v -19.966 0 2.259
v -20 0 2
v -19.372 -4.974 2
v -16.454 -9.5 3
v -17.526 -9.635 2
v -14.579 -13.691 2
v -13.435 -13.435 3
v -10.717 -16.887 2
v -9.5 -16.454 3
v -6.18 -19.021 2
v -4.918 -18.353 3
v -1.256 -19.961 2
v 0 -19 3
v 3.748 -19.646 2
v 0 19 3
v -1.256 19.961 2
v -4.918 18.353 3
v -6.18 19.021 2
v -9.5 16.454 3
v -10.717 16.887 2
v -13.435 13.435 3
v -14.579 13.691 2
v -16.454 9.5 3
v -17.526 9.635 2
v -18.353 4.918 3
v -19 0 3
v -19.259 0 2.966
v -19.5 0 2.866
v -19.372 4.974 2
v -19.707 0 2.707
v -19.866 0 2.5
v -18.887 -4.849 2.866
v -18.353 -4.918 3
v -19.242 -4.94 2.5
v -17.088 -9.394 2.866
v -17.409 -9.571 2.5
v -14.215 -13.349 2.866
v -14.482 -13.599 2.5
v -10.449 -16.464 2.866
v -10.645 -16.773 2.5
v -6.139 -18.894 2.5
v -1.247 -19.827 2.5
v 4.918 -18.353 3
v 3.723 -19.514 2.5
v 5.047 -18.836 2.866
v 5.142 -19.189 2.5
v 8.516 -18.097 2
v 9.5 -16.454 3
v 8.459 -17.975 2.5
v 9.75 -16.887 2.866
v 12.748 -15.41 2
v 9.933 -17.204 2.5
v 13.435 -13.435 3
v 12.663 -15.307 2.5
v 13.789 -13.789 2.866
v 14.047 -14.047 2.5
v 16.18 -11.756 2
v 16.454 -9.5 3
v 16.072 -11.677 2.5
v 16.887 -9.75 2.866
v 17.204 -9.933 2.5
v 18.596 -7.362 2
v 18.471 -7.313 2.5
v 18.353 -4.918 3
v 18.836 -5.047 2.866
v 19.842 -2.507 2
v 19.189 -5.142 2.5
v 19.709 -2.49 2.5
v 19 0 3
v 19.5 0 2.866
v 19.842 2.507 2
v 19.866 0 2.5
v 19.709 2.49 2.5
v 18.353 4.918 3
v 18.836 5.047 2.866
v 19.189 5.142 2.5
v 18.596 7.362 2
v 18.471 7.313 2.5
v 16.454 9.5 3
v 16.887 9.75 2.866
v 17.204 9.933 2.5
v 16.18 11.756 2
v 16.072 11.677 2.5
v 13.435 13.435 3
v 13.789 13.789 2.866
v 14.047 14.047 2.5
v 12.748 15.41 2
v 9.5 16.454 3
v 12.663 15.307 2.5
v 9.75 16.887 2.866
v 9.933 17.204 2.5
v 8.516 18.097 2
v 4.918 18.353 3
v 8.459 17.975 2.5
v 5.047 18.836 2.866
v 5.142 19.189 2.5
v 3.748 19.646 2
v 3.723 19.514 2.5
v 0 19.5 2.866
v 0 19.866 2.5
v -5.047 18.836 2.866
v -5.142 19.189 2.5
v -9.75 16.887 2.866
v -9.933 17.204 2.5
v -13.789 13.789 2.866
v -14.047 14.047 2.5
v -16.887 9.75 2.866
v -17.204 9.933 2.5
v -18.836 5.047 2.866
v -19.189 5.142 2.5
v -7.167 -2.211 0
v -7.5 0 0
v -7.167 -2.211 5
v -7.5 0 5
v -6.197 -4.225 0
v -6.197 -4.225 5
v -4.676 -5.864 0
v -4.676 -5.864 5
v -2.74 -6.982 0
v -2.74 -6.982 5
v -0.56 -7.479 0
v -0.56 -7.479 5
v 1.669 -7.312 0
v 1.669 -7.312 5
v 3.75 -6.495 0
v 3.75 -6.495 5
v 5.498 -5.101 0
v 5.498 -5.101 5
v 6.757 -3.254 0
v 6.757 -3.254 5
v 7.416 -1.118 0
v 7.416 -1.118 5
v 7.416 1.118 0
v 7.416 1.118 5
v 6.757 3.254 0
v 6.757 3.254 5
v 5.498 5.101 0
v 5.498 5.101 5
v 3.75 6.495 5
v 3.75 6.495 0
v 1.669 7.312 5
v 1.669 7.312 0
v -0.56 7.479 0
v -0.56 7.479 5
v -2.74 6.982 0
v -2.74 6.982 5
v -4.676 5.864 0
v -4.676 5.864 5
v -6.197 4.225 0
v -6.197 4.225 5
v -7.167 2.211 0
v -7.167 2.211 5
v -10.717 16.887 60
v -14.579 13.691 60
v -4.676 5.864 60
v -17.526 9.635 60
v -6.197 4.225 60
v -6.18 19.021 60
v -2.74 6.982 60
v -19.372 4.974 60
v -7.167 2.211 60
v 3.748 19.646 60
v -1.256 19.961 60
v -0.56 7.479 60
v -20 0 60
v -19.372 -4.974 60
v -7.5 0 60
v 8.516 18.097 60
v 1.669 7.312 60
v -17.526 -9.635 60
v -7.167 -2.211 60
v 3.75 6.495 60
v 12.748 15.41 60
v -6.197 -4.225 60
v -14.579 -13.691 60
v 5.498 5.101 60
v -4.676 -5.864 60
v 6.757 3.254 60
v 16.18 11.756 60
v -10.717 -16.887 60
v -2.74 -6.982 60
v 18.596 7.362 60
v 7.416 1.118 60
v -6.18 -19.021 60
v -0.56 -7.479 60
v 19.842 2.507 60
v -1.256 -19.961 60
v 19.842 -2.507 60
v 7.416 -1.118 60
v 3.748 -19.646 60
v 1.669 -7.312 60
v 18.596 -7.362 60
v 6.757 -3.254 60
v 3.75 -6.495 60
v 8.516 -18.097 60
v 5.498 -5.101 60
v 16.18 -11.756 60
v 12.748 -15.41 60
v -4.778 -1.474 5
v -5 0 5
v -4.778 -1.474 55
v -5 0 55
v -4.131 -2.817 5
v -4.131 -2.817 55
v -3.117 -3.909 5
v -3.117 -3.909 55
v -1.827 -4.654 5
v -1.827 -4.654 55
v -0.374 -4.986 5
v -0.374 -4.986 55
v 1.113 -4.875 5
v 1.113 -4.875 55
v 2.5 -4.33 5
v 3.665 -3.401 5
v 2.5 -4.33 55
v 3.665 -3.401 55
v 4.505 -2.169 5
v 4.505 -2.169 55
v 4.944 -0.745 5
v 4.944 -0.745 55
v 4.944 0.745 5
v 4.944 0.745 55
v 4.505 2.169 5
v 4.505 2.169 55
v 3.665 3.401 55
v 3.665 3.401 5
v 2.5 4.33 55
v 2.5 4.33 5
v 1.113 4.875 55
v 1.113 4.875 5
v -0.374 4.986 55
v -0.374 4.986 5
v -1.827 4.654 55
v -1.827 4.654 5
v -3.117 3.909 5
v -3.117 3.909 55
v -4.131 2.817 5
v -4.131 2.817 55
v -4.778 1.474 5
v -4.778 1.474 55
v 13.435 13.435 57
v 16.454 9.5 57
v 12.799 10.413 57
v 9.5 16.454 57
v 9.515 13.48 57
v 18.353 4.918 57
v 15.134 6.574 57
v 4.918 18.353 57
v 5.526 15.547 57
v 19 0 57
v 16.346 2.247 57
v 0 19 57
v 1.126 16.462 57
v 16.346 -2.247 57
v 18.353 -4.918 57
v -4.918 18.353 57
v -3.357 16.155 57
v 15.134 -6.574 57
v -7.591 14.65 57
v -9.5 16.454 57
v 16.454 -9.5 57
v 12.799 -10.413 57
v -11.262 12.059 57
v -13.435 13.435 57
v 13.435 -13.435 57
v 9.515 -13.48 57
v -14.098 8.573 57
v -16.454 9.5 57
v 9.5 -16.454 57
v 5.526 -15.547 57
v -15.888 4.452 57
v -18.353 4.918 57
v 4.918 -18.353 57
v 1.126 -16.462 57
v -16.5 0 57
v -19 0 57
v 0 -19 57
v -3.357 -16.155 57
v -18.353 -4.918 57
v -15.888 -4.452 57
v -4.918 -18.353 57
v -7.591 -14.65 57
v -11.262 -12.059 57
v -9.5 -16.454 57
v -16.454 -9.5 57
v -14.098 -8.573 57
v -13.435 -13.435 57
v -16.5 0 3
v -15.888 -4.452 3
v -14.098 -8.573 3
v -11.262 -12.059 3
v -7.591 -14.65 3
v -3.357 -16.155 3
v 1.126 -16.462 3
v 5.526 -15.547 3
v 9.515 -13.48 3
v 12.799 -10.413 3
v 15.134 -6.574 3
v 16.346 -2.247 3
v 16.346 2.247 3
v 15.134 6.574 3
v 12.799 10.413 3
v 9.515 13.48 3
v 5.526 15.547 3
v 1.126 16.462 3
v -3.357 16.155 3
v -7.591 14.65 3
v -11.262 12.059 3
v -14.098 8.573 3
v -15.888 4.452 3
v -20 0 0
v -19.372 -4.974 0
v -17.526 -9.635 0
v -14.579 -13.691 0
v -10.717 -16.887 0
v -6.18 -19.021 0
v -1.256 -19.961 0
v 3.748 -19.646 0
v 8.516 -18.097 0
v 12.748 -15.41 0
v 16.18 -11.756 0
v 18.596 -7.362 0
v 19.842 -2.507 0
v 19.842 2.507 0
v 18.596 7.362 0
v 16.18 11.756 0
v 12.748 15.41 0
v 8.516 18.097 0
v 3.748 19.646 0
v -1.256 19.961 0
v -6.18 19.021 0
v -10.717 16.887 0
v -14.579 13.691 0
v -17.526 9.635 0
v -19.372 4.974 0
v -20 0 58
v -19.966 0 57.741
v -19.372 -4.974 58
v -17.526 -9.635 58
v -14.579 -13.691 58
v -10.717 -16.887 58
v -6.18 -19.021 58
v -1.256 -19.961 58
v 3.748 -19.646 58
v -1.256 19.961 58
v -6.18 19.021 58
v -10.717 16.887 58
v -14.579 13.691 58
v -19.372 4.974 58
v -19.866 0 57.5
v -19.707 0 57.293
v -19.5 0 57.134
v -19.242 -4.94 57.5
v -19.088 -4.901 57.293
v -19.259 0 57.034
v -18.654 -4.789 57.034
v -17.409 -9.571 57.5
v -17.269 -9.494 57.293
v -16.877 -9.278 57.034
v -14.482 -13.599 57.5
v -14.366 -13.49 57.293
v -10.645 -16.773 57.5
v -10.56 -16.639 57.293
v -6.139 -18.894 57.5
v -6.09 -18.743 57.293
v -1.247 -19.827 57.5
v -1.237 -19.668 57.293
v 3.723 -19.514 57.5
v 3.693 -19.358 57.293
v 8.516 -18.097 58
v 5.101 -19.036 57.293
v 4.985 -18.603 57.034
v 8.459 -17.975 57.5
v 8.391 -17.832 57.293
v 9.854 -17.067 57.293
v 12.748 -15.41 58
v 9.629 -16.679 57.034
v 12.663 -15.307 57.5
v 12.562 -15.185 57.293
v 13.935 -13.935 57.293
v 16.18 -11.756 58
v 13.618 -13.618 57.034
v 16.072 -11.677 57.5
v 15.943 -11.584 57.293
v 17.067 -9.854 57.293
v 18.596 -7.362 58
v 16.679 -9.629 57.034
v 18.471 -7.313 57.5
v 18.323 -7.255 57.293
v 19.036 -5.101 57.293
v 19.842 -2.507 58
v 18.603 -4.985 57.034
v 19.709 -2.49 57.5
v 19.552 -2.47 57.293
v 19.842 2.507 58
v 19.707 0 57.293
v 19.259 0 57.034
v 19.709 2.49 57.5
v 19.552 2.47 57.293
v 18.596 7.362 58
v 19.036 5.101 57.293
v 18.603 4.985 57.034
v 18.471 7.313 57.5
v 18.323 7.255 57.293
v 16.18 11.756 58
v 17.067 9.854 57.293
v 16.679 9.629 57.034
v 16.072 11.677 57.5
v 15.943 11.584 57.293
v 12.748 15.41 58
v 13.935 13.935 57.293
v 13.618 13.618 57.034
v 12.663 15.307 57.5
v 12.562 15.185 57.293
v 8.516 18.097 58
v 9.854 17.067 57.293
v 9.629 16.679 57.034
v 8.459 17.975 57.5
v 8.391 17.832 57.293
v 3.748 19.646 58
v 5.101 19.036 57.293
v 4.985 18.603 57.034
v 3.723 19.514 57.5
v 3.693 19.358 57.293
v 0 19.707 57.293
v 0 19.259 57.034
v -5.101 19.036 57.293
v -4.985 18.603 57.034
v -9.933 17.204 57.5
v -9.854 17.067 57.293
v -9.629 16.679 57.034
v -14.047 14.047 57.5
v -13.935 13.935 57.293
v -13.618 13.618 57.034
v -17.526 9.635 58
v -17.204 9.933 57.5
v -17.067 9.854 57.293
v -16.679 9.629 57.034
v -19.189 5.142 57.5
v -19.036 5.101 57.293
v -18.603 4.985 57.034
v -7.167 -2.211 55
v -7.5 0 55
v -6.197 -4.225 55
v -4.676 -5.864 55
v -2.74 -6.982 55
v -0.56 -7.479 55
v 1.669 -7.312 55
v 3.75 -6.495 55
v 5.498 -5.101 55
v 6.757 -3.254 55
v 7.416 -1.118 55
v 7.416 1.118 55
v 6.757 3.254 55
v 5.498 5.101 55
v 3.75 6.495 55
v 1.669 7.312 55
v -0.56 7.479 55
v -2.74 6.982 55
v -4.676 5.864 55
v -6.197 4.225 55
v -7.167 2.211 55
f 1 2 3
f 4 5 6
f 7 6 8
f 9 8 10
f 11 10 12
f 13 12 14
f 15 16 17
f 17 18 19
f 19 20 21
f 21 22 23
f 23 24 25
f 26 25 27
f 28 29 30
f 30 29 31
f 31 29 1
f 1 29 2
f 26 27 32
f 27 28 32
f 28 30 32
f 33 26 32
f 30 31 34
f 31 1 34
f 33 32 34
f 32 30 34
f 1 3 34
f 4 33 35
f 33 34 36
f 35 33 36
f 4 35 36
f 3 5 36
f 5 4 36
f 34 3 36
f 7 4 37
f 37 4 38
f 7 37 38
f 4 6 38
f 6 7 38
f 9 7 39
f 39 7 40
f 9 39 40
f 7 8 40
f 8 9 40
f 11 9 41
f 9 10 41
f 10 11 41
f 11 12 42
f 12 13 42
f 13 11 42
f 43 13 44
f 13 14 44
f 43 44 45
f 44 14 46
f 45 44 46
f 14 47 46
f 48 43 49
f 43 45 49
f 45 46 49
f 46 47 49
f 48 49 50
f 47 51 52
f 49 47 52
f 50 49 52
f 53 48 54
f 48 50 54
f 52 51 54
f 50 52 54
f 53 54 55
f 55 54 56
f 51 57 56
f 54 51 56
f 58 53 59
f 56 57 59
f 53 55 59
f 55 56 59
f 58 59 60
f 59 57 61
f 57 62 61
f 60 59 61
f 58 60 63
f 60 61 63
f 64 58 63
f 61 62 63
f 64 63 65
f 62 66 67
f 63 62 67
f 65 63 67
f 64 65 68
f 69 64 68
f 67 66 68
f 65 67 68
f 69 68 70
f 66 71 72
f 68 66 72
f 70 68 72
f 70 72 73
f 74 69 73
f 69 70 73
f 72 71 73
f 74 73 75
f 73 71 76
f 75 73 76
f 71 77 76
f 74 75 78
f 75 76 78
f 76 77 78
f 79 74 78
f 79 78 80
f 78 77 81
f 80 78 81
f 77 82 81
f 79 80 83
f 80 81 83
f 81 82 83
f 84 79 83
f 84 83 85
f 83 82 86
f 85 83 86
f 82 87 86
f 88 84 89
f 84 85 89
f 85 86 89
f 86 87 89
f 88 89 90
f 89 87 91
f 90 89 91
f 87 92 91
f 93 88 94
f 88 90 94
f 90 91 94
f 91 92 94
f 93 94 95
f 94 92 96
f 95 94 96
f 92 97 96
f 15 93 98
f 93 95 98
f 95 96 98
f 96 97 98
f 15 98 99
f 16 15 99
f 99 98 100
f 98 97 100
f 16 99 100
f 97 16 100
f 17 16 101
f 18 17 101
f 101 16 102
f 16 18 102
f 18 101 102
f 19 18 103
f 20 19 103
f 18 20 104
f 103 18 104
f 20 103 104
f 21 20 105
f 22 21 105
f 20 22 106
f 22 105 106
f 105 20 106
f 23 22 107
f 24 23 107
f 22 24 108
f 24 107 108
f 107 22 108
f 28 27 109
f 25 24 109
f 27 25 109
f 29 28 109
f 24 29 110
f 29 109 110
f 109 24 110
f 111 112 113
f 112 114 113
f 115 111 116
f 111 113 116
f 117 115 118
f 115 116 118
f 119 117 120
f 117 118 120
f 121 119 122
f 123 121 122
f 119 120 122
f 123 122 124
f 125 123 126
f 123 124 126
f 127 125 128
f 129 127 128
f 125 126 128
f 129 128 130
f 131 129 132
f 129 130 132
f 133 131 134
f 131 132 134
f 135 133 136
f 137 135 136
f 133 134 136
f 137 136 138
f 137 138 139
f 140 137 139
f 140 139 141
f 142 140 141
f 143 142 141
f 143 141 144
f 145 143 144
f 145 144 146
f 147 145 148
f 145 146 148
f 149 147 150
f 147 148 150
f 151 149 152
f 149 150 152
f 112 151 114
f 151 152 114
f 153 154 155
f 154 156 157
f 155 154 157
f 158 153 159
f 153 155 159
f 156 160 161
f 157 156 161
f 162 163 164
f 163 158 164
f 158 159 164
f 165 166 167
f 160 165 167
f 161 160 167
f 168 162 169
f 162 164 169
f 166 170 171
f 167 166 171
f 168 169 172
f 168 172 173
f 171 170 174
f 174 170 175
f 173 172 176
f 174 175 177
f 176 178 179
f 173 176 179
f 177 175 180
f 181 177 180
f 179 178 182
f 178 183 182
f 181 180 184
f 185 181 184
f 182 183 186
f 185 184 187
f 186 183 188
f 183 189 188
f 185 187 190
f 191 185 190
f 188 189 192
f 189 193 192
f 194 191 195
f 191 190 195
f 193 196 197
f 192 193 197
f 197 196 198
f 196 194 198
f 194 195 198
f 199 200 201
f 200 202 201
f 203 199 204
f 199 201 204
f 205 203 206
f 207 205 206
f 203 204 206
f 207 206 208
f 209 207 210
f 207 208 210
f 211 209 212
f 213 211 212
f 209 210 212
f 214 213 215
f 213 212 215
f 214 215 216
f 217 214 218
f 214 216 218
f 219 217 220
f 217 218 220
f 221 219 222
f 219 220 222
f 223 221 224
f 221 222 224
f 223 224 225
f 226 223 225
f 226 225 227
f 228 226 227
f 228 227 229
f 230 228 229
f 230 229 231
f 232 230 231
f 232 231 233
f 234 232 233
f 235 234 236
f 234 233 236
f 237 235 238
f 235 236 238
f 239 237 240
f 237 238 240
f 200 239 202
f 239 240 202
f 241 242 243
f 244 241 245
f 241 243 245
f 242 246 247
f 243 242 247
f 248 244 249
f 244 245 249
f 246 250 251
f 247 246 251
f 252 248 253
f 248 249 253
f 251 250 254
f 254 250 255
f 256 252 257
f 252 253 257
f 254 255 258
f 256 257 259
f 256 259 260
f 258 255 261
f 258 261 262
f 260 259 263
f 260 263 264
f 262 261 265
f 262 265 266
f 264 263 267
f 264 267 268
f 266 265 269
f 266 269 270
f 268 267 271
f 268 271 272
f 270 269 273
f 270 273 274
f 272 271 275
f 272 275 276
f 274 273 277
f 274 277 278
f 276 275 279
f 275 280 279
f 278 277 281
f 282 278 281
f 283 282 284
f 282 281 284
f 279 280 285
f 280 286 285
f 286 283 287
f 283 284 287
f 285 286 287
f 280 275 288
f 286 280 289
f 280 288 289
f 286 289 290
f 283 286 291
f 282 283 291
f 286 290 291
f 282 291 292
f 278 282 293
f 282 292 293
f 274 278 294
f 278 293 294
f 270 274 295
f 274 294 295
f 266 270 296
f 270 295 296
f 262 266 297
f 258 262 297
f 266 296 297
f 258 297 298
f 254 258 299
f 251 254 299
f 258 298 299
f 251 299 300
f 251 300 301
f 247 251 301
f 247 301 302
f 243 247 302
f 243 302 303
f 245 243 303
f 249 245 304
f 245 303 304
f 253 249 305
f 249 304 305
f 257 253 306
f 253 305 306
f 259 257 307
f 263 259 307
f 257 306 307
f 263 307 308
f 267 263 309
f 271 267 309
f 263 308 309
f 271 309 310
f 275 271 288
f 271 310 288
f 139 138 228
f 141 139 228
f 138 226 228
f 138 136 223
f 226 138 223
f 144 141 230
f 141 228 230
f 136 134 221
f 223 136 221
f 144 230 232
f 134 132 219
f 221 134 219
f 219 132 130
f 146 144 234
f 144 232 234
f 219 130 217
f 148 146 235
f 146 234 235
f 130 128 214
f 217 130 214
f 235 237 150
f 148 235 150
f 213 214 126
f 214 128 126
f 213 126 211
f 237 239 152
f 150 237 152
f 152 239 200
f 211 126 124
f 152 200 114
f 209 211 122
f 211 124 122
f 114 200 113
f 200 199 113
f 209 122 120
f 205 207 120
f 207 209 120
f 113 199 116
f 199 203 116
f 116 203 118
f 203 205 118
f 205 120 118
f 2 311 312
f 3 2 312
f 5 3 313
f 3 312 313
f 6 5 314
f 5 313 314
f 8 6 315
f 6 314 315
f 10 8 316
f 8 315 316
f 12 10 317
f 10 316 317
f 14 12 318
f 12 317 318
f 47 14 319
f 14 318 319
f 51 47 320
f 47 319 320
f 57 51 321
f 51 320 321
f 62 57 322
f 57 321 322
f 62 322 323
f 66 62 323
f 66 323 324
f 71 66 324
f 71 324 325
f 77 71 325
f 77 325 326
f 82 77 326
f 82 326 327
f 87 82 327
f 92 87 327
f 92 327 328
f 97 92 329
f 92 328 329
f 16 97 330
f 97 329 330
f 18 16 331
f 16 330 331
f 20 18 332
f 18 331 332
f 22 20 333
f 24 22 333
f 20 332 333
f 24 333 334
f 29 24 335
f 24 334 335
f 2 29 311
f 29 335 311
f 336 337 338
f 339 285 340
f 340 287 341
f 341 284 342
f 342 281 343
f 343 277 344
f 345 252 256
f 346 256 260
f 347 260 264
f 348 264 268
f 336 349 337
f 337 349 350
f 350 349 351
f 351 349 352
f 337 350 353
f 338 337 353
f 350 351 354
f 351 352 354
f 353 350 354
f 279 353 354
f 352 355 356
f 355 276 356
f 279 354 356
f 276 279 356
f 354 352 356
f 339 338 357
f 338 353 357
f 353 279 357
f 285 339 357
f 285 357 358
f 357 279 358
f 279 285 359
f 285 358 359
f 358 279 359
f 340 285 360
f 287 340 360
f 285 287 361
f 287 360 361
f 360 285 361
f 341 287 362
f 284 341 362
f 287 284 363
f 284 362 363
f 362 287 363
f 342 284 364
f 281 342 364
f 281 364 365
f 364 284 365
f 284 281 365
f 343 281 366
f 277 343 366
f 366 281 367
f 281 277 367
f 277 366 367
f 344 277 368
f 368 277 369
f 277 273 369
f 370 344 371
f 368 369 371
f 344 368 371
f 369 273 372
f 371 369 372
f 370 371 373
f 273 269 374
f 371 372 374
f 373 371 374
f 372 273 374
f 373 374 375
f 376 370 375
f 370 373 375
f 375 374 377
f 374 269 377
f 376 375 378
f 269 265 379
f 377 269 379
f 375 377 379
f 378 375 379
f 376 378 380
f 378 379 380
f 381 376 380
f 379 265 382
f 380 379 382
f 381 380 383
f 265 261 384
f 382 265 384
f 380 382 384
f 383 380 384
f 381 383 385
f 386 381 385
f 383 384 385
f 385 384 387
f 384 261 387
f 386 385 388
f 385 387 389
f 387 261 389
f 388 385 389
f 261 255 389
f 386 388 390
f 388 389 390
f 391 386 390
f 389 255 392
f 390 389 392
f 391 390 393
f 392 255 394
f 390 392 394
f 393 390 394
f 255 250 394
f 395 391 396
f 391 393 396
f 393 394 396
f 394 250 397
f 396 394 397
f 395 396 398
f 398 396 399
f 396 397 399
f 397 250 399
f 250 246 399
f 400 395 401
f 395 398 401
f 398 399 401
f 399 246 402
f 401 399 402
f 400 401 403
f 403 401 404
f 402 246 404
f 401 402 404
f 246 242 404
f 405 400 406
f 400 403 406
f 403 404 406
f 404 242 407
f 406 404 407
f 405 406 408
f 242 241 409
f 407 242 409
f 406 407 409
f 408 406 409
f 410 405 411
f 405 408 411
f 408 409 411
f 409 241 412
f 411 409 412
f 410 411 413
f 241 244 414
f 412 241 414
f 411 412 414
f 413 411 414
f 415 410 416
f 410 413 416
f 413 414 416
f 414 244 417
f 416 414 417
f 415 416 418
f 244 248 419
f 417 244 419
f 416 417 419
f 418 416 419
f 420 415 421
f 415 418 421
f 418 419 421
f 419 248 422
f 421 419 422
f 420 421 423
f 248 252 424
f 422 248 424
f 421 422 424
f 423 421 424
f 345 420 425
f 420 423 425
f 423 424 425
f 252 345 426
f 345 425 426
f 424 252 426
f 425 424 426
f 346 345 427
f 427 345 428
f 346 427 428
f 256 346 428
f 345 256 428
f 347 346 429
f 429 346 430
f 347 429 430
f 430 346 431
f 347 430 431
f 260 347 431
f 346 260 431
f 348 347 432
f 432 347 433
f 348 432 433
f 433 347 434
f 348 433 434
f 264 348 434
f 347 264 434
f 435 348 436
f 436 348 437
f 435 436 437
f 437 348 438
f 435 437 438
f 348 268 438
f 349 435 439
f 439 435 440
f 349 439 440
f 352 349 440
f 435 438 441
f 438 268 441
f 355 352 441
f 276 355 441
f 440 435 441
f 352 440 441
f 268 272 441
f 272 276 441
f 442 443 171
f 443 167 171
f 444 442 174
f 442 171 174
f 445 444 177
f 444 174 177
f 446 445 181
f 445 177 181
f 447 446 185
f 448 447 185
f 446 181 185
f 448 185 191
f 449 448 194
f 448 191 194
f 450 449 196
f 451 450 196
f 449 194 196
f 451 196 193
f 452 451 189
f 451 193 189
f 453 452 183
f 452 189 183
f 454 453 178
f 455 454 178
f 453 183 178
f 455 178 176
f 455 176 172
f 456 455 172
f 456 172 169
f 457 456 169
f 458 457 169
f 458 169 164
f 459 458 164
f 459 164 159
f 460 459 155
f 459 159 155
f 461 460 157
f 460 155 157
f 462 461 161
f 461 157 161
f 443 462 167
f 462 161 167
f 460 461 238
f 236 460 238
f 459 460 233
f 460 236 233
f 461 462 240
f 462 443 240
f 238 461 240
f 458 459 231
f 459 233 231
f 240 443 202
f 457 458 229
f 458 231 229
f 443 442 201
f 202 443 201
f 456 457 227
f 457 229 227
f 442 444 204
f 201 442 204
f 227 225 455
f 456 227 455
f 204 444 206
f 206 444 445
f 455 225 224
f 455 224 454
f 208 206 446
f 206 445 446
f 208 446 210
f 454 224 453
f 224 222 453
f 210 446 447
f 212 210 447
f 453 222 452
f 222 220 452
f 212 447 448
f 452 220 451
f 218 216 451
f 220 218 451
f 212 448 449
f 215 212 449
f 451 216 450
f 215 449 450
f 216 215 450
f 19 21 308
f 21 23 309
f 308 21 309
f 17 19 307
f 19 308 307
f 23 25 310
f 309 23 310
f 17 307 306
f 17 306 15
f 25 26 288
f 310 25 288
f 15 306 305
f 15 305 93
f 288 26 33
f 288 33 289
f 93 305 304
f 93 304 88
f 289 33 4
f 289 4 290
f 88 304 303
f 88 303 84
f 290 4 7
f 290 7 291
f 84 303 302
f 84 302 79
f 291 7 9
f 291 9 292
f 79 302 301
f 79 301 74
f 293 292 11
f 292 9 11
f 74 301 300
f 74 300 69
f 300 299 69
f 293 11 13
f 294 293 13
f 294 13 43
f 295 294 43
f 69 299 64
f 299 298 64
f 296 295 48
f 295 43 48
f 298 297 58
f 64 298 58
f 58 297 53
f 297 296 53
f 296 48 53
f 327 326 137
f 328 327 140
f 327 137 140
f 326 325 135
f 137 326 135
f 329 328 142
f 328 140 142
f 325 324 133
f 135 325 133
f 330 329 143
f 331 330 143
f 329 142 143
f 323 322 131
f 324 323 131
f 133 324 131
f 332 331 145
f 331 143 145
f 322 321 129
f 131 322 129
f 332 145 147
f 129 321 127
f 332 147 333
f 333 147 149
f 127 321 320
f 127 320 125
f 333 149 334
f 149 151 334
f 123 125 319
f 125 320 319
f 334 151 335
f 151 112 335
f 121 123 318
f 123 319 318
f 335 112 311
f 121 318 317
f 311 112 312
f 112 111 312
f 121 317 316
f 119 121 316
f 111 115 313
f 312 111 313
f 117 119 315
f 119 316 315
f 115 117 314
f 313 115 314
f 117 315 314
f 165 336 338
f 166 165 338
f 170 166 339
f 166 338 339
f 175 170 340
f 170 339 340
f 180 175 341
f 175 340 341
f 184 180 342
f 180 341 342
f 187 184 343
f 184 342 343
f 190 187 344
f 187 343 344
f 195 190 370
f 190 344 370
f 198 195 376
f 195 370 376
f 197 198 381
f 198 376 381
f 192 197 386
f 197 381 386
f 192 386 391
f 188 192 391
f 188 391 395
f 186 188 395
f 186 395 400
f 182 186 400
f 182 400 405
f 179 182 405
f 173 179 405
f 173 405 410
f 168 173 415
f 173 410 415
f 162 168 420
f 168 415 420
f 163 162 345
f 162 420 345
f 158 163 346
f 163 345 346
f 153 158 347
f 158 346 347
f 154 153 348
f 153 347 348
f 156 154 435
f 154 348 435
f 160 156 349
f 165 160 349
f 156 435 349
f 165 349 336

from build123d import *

# Parameters (mm, degrees)
FILLET_2_R = 1


with BuildPart() as part:
    # 草图1 → 旋转1 (revolve)
    with BuildSketch(Plane(origin=(0, 0, 0), x_dir=(1, 0, 0), z_dir=(0, 1, 0)), mode=Mode.PRIVATE) as revolve_1_sk:
        Polygon((7.5, -55), (7.5, -60), (20, -60), (20, -57), (16.5, -57), (16.5, -3), (20, -3), (20, 0), (7.5, 0), (7.5, -5), (5, -5), (5, -55), align=None)
    revolve(revolve_1_sk.sketch.rotate(Axis((0, 0, 0), (0, 0, 1)), 180), axis=Axis((0, 0, 0), (0, 0, 1)))

    # 圆角2
    fillet_2_edges = [part.edges().sort_by_distance(p)[0] for p in [
        (20, 0, 3),
        (20, 0, 57),
    ]]
    fillet(fillet_2_edges, radius=FILLET_2_R)


solid = part.part
